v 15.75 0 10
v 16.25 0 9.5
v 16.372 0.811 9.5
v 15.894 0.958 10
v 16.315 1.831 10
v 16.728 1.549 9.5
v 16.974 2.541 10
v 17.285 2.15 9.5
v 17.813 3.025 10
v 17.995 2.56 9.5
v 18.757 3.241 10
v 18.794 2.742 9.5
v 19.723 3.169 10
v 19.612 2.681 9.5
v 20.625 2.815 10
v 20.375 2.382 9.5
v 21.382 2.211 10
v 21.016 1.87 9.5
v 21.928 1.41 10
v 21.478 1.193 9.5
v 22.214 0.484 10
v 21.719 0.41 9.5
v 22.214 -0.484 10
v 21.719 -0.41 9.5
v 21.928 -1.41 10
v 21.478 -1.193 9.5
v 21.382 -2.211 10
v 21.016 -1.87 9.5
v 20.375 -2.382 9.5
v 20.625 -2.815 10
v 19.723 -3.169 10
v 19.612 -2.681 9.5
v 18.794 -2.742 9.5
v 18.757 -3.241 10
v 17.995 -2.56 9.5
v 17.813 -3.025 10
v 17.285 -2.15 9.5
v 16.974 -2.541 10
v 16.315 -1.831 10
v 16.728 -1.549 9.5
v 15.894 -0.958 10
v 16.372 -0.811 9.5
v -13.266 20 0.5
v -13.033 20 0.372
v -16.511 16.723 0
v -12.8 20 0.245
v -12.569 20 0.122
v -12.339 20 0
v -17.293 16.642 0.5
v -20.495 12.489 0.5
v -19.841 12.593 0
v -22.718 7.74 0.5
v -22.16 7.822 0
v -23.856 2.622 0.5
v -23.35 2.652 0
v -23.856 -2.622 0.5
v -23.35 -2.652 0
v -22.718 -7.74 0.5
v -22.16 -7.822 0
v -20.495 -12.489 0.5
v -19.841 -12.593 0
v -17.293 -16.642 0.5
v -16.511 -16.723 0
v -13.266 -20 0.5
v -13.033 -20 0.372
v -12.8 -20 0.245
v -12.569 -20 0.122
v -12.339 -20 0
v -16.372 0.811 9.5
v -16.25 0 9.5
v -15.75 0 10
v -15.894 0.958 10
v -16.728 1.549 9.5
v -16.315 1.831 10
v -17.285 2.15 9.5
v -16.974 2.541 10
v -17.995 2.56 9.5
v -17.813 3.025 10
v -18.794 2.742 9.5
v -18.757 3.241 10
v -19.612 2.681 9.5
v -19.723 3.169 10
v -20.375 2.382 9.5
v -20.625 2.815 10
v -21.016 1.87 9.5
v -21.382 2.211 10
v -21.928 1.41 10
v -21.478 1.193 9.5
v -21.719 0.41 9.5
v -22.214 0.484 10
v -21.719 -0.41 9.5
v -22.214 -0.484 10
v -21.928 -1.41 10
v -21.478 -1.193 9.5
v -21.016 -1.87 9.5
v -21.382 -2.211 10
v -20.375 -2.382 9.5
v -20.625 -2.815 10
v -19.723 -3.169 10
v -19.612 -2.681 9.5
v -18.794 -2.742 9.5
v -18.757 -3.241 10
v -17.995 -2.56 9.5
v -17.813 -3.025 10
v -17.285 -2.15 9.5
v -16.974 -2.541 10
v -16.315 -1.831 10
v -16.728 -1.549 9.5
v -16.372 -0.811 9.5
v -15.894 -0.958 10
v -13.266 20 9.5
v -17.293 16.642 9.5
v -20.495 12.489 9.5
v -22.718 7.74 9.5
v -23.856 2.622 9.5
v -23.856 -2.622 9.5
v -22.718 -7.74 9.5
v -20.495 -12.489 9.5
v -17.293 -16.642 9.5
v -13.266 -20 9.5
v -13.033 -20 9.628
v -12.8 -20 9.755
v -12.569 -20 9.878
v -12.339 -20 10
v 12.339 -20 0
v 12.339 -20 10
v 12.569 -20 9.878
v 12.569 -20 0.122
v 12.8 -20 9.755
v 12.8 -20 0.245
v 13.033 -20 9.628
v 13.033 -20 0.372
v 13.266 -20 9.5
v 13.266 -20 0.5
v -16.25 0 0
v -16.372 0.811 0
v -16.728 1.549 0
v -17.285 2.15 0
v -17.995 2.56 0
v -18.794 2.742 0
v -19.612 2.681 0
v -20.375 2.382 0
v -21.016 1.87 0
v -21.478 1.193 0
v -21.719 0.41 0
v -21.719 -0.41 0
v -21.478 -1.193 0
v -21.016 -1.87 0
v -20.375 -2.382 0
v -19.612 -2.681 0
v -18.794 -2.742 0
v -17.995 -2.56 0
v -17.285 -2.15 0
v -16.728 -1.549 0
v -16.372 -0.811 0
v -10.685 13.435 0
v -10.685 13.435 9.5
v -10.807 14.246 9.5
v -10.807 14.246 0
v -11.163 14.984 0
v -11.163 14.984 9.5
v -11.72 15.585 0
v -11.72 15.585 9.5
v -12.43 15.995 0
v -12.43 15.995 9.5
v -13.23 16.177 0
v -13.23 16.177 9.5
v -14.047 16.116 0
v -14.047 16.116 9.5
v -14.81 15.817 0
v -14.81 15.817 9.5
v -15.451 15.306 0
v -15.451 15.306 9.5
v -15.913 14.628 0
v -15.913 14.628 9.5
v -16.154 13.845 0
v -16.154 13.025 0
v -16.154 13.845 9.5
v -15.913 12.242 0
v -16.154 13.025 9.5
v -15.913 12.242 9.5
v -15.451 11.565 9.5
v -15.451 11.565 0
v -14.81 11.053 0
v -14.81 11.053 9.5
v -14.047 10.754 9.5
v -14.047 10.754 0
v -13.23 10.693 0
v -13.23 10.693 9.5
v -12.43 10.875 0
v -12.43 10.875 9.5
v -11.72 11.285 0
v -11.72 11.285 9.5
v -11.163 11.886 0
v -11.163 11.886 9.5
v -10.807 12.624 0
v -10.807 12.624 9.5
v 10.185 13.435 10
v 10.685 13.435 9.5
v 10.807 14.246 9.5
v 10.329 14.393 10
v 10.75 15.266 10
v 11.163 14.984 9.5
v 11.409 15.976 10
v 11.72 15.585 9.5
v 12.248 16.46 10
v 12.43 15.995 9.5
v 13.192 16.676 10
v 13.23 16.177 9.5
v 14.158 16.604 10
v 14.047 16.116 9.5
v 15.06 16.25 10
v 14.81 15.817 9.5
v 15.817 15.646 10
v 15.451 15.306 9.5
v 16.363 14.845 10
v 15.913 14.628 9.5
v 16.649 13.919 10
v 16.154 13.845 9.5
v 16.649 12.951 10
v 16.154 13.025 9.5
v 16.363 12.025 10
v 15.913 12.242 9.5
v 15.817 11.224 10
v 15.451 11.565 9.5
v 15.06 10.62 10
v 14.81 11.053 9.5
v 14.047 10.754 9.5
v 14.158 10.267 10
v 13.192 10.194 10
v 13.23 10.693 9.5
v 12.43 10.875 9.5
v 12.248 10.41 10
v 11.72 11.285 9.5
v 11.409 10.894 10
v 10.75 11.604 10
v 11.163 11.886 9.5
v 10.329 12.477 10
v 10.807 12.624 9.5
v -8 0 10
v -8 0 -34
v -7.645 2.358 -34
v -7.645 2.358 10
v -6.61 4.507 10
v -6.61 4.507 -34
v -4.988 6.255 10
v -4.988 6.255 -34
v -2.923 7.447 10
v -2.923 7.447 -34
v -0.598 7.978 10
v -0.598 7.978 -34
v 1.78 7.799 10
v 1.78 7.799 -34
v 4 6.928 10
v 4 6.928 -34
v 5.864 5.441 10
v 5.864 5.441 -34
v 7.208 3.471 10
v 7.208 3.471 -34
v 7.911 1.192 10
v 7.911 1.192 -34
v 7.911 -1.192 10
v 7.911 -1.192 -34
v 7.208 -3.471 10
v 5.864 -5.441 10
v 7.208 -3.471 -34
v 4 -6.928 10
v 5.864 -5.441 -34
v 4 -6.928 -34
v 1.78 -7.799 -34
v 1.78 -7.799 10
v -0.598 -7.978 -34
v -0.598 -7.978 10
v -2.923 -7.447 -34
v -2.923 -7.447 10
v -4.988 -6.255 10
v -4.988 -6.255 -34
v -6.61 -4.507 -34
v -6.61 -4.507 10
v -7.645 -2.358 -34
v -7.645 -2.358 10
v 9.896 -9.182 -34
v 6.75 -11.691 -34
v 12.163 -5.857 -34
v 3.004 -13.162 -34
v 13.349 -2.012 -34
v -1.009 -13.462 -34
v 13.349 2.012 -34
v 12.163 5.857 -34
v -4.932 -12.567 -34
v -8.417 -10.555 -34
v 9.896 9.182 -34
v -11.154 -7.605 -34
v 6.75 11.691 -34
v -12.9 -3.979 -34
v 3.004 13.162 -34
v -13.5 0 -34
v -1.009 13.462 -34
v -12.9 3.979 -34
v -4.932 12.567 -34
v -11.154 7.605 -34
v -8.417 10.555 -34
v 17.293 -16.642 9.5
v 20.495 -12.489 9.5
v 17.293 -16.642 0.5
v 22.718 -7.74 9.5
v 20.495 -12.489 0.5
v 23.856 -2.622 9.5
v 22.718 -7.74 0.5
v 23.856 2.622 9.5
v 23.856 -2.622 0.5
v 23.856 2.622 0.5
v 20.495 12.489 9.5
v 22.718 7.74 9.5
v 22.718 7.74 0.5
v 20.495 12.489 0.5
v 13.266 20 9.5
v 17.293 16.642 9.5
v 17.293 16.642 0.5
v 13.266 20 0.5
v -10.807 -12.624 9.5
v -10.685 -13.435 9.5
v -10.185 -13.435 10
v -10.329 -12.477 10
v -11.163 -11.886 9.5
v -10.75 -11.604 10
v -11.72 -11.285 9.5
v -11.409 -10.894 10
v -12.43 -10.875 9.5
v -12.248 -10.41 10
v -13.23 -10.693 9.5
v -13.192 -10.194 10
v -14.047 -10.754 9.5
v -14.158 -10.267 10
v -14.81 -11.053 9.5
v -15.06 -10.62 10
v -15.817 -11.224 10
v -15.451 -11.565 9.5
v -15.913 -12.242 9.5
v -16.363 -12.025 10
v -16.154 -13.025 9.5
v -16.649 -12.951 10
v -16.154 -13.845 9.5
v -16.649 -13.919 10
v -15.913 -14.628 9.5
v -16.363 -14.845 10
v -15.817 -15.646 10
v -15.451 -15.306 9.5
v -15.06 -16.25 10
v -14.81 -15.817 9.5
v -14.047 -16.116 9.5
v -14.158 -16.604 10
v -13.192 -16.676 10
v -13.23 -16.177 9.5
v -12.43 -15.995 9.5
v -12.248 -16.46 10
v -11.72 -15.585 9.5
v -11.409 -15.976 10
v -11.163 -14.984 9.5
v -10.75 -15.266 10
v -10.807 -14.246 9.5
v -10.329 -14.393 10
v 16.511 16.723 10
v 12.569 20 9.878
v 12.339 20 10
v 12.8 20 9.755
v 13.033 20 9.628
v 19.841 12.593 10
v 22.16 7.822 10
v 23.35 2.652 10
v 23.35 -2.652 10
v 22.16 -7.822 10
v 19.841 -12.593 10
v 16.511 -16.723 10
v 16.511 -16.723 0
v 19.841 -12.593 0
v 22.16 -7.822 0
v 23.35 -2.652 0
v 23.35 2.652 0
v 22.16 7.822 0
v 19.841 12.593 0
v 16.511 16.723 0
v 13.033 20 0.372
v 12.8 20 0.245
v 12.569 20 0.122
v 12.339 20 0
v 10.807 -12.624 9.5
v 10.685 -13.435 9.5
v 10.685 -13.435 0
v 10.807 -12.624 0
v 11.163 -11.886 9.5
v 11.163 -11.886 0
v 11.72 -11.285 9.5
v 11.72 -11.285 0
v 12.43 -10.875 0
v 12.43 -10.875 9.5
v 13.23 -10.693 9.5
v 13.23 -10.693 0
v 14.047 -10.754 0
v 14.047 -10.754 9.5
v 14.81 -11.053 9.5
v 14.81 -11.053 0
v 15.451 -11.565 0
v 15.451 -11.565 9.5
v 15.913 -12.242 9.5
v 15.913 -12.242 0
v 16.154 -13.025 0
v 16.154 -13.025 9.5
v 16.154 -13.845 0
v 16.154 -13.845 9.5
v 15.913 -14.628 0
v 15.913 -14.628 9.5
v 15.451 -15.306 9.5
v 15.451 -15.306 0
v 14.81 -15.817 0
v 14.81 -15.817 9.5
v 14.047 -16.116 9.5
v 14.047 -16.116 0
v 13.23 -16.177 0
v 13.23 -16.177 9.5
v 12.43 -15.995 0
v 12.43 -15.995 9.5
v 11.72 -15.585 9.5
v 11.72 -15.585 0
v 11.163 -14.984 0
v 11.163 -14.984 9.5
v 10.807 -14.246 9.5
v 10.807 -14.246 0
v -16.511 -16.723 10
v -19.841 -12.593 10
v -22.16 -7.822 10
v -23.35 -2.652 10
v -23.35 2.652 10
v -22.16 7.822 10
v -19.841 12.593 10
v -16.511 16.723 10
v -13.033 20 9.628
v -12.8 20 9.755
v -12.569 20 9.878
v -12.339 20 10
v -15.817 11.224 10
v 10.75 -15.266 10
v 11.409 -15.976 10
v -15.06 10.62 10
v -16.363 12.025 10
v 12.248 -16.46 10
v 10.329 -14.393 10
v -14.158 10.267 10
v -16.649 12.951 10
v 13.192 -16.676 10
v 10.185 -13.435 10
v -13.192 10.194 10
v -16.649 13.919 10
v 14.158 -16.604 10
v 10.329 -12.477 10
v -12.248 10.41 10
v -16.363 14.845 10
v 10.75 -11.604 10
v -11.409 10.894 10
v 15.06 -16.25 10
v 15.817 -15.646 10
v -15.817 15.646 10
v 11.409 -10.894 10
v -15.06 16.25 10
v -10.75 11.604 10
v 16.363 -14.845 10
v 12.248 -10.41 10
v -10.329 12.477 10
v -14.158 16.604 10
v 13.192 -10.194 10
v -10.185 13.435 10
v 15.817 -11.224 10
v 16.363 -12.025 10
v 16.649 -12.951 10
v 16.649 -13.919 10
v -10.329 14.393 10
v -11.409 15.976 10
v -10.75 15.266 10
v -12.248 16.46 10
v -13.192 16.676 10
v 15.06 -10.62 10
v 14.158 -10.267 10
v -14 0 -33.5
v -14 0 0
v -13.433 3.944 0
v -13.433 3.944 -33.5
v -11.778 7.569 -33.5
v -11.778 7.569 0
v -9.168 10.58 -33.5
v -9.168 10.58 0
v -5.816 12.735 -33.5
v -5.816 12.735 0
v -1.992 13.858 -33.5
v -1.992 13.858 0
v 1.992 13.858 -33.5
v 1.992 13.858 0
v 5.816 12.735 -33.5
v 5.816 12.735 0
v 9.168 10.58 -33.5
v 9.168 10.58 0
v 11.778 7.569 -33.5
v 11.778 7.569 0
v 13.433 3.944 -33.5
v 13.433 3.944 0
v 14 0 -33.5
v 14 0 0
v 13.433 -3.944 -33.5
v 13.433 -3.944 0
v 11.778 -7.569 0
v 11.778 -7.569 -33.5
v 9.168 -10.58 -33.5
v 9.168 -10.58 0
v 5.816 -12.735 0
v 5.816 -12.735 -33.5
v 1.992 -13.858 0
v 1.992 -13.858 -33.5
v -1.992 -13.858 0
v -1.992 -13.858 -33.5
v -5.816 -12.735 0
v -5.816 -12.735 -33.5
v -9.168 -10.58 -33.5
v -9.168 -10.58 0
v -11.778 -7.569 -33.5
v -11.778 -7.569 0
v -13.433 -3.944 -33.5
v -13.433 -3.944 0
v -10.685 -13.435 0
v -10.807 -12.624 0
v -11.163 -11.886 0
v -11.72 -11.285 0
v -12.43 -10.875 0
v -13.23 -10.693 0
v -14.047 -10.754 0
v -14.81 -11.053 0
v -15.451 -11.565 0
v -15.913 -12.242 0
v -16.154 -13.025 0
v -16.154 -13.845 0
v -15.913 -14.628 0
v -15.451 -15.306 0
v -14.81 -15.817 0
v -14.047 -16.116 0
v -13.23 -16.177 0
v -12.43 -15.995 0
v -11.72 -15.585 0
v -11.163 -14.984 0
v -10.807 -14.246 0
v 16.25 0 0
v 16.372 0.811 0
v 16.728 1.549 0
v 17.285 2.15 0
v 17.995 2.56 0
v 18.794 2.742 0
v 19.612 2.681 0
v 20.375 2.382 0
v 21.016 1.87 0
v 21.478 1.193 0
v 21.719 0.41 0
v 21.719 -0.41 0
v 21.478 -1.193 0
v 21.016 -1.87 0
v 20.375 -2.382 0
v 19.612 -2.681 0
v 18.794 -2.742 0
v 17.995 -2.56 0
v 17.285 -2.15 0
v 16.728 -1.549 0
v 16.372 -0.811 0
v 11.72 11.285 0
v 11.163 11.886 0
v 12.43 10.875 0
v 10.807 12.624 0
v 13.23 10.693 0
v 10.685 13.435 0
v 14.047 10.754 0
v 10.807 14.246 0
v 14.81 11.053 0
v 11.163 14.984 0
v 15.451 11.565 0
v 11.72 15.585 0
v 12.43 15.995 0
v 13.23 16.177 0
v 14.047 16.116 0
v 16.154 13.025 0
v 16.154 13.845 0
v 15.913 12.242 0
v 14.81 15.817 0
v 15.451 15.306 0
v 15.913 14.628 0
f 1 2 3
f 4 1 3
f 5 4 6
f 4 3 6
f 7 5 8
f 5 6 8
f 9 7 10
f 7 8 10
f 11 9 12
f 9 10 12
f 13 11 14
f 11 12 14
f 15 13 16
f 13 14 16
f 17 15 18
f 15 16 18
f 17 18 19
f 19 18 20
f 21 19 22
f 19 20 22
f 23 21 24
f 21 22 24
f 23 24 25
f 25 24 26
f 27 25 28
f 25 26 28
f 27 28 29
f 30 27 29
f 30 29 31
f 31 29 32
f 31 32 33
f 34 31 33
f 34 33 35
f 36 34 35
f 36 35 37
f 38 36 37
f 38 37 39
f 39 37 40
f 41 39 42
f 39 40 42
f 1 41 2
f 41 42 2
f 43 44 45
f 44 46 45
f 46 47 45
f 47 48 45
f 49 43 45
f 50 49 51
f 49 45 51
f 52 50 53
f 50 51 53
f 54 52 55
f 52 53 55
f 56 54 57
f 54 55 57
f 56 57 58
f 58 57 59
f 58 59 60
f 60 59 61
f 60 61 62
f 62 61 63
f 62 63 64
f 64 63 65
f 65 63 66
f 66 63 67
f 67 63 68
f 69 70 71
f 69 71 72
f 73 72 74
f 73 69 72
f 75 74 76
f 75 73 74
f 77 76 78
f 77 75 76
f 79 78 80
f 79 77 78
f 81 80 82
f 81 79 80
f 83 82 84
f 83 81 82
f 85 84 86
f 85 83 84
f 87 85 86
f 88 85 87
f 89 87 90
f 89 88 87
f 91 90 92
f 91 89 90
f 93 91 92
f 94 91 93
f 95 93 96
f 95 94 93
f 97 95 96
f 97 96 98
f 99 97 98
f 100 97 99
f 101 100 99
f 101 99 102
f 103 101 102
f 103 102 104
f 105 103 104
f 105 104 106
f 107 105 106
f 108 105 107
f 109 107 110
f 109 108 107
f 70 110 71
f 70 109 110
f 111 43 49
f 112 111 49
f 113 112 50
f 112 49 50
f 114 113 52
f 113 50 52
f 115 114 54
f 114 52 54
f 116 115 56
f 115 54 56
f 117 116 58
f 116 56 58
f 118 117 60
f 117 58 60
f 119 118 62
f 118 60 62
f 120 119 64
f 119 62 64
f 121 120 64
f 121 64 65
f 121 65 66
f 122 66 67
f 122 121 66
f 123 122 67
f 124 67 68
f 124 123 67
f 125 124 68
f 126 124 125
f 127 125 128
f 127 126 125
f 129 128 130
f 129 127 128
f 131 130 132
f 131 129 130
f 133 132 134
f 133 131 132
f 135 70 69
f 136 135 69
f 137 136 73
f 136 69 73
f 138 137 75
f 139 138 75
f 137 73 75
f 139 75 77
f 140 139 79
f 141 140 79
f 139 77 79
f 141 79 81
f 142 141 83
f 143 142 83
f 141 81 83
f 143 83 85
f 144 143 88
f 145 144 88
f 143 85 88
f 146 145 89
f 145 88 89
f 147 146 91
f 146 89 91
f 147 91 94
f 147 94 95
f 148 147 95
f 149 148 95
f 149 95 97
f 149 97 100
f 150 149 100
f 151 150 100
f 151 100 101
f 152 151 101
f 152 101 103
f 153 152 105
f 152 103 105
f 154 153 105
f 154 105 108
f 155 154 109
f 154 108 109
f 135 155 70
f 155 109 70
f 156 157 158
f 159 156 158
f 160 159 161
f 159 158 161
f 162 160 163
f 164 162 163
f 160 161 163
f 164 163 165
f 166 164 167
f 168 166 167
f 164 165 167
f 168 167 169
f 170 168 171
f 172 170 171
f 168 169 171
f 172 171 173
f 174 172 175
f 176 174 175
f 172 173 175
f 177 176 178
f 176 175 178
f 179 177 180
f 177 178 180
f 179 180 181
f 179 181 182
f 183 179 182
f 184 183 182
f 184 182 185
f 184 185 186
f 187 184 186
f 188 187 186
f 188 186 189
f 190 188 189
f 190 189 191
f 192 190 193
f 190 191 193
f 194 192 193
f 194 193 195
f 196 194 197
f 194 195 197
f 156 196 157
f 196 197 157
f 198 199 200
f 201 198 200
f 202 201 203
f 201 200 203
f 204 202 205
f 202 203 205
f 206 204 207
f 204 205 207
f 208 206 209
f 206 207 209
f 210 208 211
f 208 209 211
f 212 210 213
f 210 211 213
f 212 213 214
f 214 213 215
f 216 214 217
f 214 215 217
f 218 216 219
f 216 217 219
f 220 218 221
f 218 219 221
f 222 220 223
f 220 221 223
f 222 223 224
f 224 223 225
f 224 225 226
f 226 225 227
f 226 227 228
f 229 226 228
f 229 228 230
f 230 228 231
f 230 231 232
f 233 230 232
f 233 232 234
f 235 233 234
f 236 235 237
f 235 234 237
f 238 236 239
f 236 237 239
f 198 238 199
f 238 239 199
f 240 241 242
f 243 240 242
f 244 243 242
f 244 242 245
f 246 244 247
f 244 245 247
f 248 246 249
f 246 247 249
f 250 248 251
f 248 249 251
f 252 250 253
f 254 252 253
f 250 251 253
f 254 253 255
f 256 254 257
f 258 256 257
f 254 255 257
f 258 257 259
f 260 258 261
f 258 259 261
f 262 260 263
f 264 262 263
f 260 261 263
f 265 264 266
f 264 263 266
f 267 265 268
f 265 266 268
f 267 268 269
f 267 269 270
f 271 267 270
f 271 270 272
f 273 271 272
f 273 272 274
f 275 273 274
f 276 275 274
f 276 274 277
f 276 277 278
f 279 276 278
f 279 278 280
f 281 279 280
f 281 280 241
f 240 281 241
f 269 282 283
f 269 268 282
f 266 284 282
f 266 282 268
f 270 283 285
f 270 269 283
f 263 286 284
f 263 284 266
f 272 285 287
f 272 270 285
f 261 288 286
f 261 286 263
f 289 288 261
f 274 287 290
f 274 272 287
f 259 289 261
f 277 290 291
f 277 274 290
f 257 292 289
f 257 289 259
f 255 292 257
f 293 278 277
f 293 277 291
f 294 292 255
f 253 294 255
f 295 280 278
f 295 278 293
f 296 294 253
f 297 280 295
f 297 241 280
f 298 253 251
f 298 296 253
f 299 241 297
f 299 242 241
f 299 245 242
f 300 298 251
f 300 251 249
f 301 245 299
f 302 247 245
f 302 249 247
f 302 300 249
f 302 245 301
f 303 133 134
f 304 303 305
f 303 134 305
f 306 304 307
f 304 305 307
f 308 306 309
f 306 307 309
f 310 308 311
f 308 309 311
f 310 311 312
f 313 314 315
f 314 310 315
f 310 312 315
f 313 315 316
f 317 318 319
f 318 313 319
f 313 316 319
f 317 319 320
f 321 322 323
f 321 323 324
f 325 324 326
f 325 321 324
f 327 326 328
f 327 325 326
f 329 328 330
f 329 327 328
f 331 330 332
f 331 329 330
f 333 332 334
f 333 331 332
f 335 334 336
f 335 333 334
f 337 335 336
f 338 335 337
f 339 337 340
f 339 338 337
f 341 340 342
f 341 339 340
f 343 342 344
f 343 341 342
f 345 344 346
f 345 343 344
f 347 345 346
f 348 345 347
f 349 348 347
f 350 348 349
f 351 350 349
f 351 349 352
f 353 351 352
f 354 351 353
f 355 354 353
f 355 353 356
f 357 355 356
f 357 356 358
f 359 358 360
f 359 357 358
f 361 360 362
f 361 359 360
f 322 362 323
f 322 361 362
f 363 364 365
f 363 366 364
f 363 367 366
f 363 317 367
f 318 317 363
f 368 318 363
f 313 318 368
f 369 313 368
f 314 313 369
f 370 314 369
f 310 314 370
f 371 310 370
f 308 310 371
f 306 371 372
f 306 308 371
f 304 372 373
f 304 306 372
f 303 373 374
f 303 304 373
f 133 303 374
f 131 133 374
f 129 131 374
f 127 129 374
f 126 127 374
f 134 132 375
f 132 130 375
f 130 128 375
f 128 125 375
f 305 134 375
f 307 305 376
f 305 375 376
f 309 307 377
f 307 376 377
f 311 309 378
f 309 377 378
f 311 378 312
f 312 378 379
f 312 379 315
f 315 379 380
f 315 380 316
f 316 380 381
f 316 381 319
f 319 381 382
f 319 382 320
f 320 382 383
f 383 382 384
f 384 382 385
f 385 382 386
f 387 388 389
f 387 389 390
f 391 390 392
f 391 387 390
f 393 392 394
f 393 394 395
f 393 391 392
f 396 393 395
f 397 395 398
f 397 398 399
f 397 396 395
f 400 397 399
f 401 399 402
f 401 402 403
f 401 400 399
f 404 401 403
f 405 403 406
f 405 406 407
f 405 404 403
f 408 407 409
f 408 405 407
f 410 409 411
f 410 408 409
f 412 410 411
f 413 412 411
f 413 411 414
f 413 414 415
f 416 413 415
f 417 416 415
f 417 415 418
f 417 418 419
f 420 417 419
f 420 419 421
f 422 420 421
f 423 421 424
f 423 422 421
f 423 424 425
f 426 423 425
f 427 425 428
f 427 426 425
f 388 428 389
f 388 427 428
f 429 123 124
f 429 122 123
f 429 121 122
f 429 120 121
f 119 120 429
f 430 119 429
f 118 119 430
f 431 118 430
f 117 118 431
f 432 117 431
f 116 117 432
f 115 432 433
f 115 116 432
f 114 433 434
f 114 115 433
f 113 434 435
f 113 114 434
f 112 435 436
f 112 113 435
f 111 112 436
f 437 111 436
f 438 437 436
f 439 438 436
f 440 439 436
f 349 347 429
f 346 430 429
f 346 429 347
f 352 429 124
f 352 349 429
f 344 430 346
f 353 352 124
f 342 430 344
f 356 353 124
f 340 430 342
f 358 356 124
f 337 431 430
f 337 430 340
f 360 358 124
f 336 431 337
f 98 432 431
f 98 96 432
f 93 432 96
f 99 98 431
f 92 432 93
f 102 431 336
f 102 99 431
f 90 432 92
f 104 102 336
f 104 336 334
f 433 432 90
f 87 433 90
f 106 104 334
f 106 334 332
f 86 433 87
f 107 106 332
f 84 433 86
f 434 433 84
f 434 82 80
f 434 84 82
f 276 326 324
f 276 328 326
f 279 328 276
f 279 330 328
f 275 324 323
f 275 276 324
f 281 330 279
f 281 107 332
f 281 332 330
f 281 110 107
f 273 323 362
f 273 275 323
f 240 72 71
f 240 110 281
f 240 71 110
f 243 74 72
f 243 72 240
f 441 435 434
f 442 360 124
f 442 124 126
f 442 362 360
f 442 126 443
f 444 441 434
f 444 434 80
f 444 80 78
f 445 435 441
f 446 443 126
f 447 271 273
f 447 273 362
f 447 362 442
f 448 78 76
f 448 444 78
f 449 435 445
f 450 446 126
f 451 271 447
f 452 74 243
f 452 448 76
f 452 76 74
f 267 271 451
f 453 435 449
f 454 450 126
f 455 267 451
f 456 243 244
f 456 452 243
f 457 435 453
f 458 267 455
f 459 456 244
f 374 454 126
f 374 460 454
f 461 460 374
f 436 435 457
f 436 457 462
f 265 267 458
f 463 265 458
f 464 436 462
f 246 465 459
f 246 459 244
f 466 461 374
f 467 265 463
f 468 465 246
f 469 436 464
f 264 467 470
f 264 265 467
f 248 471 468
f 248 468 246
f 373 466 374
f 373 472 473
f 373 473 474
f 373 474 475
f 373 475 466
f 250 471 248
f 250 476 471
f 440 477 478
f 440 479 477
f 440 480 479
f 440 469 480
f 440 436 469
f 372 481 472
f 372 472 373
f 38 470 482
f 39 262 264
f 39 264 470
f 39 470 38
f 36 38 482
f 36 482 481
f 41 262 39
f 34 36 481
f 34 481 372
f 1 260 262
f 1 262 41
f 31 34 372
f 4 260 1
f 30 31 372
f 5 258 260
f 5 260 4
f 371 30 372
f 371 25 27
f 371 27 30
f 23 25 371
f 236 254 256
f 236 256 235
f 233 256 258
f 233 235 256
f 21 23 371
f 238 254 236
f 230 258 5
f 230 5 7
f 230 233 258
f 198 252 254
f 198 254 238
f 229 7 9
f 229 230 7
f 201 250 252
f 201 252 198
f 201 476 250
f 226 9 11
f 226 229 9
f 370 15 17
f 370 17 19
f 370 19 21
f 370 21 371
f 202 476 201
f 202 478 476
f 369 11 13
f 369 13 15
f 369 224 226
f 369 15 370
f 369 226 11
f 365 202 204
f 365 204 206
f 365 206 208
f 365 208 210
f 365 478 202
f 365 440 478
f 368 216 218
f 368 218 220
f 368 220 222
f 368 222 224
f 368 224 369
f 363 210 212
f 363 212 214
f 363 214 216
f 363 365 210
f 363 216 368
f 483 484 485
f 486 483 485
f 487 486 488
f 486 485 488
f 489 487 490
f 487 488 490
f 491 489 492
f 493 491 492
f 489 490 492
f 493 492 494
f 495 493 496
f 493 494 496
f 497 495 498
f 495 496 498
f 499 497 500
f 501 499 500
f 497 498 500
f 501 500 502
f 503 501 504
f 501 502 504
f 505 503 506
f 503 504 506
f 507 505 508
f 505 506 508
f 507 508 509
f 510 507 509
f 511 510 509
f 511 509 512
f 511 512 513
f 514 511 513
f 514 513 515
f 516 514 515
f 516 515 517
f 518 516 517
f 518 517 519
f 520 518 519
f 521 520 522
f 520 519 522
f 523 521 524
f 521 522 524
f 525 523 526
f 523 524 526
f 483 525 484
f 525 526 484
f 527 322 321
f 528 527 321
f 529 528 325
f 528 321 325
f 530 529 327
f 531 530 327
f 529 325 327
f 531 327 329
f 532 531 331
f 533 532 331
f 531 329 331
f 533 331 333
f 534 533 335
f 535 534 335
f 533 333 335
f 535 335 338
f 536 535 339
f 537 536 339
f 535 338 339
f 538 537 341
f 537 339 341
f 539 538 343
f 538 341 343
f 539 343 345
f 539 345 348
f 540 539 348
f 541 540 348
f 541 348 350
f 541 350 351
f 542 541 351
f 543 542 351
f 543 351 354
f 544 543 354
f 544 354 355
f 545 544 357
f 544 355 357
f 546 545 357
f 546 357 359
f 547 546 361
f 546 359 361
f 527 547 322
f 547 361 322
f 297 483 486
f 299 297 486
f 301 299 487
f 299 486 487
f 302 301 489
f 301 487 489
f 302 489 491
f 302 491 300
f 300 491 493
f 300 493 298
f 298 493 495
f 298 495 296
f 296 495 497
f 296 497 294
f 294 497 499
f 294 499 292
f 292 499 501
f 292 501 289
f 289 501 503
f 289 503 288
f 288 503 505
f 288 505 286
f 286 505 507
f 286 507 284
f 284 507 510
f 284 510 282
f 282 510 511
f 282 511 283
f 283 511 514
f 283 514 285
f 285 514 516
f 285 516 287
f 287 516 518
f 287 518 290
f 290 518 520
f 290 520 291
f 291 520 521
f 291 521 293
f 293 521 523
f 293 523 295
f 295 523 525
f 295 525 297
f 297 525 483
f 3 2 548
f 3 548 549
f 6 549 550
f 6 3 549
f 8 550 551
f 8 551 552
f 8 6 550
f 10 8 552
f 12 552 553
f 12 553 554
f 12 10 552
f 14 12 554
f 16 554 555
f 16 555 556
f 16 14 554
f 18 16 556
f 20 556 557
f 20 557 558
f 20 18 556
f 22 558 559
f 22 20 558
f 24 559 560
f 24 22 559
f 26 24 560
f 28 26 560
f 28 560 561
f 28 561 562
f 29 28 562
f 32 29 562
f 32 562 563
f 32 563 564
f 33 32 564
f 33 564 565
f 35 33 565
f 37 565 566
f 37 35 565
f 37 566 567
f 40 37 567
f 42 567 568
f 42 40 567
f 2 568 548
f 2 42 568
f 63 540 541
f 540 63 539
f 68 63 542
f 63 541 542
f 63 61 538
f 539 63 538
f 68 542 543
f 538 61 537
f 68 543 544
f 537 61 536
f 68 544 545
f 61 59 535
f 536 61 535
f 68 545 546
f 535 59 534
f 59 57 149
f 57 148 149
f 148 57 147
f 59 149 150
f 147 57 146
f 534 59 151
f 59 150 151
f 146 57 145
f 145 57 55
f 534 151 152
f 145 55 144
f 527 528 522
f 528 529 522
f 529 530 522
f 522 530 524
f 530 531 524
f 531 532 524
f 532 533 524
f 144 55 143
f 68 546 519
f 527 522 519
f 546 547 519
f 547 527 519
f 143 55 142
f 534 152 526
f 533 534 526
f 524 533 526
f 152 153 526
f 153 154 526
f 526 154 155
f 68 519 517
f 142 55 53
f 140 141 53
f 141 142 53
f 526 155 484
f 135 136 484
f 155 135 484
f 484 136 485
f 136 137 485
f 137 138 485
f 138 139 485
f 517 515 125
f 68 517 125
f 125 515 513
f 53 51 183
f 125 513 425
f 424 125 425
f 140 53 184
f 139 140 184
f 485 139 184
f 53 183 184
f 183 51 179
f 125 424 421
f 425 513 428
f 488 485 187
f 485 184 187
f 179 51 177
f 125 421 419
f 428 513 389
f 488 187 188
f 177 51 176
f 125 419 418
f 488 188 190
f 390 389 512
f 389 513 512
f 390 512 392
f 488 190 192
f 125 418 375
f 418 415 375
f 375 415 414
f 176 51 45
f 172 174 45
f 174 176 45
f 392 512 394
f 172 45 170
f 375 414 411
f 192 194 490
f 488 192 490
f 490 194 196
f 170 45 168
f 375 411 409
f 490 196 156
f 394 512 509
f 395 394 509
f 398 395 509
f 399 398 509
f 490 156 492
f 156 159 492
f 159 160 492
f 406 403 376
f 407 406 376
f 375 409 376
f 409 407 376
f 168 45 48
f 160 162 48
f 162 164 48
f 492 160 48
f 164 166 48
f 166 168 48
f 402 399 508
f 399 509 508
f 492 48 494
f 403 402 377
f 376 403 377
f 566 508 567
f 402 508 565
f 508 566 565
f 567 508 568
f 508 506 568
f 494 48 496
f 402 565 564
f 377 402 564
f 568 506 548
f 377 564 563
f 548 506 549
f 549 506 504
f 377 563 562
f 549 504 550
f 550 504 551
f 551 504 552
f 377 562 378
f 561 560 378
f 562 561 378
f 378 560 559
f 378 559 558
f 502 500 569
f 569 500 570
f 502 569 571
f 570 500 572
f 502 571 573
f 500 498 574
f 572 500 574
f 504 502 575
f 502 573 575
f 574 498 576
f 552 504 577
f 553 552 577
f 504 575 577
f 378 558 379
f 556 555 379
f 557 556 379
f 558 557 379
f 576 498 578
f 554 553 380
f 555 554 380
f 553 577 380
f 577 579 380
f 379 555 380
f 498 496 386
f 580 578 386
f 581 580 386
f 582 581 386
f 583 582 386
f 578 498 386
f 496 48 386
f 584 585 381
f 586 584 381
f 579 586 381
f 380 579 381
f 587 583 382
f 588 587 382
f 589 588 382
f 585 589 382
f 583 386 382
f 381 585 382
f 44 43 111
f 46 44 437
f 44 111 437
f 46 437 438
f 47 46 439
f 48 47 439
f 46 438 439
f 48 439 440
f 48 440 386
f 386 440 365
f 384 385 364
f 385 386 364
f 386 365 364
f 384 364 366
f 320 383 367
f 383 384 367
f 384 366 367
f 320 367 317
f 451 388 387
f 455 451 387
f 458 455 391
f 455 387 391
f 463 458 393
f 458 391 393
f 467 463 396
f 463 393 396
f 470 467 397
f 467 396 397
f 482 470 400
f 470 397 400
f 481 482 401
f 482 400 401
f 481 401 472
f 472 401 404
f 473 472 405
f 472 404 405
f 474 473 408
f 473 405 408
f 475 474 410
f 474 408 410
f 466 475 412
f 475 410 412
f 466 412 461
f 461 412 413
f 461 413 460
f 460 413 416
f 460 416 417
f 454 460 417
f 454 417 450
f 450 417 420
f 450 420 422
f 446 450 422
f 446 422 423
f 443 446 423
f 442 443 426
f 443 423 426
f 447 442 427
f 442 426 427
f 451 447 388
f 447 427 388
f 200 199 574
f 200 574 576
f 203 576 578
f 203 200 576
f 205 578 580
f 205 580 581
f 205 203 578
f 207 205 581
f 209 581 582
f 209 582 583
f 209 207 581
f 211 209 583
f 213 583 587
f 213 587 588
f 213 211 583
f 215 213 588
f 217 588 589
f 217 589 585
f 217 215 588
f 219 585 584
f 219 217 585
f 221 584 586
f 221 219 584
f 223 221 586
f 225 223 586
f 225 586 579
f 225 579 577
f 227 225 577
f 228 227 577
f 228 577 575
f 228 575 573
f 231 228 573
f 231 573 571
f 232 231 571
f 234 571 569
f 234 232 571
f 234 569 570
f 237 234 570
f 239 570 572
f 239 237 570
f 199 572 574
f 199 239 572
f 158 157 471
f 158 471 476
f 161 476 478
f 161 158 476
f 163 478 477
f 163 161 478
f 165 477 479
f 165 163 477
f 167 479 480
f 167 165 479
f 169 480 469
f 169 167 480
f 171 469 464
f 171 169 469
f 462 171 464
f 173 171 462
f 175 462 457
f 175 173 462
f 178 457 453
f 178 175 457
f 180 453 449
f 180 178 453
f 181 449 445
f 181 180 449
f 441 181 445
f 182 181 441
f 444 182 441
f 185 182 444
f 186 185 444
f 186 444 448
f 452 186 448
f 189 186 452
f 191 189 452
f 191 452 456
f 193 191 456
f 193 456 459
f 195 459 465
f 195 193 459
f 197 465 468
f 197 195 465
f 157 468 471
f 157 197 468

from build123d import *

# Parameters (mm, degrees)
SKETCH1_R                = 24
BOSS_EXTRUDE1_DEPTH      = 10
SKETCH2_R                = 14
BOSS_EXTRUDE2_DEPTH      = 34
CUT_EXTRUDE1_REACH       = 46
SKETCH3_W                = 82.684433326
SKETCH3_H                = 23.530230521
SKETCH3_W_2              = 72.226300178
SKETCH3_H_2              = 23.293039824
CUT_EXTRUDE2_REACH       = 46
SKETCH4_R                = 8
SKETCH7_R                = 2.75
CUT_EXTRUDE3_DEPTH       = 10
CHAMFER1_SIZE            = 0.5
CHAMFER1_OF_MIRROR1_SIZE = 0.5
CHAMFER2_SIZE            = 0.5


with BuildPart() as part:
    # Sketch1 → Boss-Extrude1 (new body)
    with BuildSketch(Plane.XY):
        Circle(SKETCH1_R)
    extrude(amount=BOSS_EXTRUDE1_DEPTH)

    # Sketch2 → Boss-Extrude2 (add)
    with BuildSketch(Plane(origin=(0, 0, 0), x_dir=(-1, 0, 0), z_dir=(0, 0, -1))):
        Circle(SKETCH2_R)
    extrude(amount=BOSS_EXTRUDE2_DEPTH)

    # Sketch3 → Cut-Extrude1 (cut, up to next)
    with BuildSketch(Plane.XY.offset(10), mode=Mode.PRIVATE) as cut_extrude1_sk1:
        with Locations((-2.888944578, 31.765115261)):
            Rectangle(SKETCH3_W, SKETCH3_H)
    cut_extrude1_tool1 = extrude(cut_extrude1_sk1.sketch, amount=-CUT_EXTRUDE1_REACH, mode=Mode.PRIVATE) & part.part
    add(cut_extrude1_tool1.solids().sort_by_distance((-2.888945, 31.765115, 10))[0], mode=Mode.SUBTRACT)
    # Sketch3 → Cut-Extrude1 (cut, up to next)
    with BuildSketch(Plane.XY.offset(10), mode=Mode.PRIVATE) as cut_extrude1_sk2:
        with Locations((2.340121996, -31.646519912)):
            Rectangle(SKETCH3_W_2, SKETCH3_H_2)
    cut_extrude1_tool2 = extrude(cut_extrude1_sk2.sketch, amount=-CUT_EXTRUDE1_REACH, mode=Mode.PRIVATE) & part.part
    add(cut_extrude1_tool2.solids().sort_by_distance((2.340122, -31.64652, 10))[0], mode=Mode.SUBTRACT)

    # Sketch4 → Cut-Extrude2 (cut, up to next)
    with BuildSketch(Plane(origin=(0, 0, -34), x_dir=(-1, 0, 0), z_dir=(0, 0, -1)), mode=Mode.PRIVATE) as cut_extrude2_sk1:
        Circle(SKETCH4_R)
    cut_extrude2_tool1 = extrude(cut_extrude2_sk1.sketch, amount=-CUT_EXTRUDE2_REACH, mode=Mode.PRIVATE) & part.part
    add(cut_extrude2_tool1.solids().sort_by_distance((0, 0, -34))[0], mode=Mode.SUBTRACT)

    # Sketch7 → Cut-Extrude3 (cut)
    with BuildSketch(Plane.XY.offset(10)):
        with Locations((-13.435028843, 13.435028843)):
            Circle(SKETCH7_R)
        with Locations((-19, 0)):
            Circle(SKETCH7_R)
        with Locations((-13.435028843, -13.435028843)):
            Circle(SKETCH7_R)
    cut_extrude3 = extrude(amount=-CUT_EXTRUDE3_DEPTH, mode=Mode.SUBTRACT)

    # Chamfer1
    chamfer1_edges = [part.edges().sort_by_distance(p)[0] for p in [
        (-16.185028843, 13.435028843, 10),
        (-21.75, 0, 10),
        (-16.185028843, -13.435028843, 10),
    ]]
    chamfer(chamfer1_edges, length=CHAMFER1_SIZE)

    # Mirror1: Cut-Extrude3 across plane
    add(cut_extrude3.mirror(Plane(origin=(0, 0, 0), x_dir=(0, 0, 1), z_dir=(1, 0, 0))), mode=Mode.SUBTRACT)

    # Chamfer1 of Mirror1
    chamfer1_of_mirror1_edges = [part.edges().sort_by_distance(p)[0] for p in [
        (16.185028843, 13.435028843, 10),
        (21.75, 0, 10),
        (16.185028843, -13.435028843, 10),
    ]]
    chamfer(chamfer1_of_mirror1_edges, length=CHAMFER1_OF_MIRROR1_SIZE)

    # Chamfer2
    chamfer2_edges = [part.edges().sort_by_distance(p)[0] for p in [
        (-24, 0, 0),
        (24, 0, 10),
        (24, 0, 0),
        (14, 0, -34),
        (-24, 0, 10),
    ]]
    chamfer(chamfer2_edges, length=CHAMFER2_SIZE)


solid = part.part
